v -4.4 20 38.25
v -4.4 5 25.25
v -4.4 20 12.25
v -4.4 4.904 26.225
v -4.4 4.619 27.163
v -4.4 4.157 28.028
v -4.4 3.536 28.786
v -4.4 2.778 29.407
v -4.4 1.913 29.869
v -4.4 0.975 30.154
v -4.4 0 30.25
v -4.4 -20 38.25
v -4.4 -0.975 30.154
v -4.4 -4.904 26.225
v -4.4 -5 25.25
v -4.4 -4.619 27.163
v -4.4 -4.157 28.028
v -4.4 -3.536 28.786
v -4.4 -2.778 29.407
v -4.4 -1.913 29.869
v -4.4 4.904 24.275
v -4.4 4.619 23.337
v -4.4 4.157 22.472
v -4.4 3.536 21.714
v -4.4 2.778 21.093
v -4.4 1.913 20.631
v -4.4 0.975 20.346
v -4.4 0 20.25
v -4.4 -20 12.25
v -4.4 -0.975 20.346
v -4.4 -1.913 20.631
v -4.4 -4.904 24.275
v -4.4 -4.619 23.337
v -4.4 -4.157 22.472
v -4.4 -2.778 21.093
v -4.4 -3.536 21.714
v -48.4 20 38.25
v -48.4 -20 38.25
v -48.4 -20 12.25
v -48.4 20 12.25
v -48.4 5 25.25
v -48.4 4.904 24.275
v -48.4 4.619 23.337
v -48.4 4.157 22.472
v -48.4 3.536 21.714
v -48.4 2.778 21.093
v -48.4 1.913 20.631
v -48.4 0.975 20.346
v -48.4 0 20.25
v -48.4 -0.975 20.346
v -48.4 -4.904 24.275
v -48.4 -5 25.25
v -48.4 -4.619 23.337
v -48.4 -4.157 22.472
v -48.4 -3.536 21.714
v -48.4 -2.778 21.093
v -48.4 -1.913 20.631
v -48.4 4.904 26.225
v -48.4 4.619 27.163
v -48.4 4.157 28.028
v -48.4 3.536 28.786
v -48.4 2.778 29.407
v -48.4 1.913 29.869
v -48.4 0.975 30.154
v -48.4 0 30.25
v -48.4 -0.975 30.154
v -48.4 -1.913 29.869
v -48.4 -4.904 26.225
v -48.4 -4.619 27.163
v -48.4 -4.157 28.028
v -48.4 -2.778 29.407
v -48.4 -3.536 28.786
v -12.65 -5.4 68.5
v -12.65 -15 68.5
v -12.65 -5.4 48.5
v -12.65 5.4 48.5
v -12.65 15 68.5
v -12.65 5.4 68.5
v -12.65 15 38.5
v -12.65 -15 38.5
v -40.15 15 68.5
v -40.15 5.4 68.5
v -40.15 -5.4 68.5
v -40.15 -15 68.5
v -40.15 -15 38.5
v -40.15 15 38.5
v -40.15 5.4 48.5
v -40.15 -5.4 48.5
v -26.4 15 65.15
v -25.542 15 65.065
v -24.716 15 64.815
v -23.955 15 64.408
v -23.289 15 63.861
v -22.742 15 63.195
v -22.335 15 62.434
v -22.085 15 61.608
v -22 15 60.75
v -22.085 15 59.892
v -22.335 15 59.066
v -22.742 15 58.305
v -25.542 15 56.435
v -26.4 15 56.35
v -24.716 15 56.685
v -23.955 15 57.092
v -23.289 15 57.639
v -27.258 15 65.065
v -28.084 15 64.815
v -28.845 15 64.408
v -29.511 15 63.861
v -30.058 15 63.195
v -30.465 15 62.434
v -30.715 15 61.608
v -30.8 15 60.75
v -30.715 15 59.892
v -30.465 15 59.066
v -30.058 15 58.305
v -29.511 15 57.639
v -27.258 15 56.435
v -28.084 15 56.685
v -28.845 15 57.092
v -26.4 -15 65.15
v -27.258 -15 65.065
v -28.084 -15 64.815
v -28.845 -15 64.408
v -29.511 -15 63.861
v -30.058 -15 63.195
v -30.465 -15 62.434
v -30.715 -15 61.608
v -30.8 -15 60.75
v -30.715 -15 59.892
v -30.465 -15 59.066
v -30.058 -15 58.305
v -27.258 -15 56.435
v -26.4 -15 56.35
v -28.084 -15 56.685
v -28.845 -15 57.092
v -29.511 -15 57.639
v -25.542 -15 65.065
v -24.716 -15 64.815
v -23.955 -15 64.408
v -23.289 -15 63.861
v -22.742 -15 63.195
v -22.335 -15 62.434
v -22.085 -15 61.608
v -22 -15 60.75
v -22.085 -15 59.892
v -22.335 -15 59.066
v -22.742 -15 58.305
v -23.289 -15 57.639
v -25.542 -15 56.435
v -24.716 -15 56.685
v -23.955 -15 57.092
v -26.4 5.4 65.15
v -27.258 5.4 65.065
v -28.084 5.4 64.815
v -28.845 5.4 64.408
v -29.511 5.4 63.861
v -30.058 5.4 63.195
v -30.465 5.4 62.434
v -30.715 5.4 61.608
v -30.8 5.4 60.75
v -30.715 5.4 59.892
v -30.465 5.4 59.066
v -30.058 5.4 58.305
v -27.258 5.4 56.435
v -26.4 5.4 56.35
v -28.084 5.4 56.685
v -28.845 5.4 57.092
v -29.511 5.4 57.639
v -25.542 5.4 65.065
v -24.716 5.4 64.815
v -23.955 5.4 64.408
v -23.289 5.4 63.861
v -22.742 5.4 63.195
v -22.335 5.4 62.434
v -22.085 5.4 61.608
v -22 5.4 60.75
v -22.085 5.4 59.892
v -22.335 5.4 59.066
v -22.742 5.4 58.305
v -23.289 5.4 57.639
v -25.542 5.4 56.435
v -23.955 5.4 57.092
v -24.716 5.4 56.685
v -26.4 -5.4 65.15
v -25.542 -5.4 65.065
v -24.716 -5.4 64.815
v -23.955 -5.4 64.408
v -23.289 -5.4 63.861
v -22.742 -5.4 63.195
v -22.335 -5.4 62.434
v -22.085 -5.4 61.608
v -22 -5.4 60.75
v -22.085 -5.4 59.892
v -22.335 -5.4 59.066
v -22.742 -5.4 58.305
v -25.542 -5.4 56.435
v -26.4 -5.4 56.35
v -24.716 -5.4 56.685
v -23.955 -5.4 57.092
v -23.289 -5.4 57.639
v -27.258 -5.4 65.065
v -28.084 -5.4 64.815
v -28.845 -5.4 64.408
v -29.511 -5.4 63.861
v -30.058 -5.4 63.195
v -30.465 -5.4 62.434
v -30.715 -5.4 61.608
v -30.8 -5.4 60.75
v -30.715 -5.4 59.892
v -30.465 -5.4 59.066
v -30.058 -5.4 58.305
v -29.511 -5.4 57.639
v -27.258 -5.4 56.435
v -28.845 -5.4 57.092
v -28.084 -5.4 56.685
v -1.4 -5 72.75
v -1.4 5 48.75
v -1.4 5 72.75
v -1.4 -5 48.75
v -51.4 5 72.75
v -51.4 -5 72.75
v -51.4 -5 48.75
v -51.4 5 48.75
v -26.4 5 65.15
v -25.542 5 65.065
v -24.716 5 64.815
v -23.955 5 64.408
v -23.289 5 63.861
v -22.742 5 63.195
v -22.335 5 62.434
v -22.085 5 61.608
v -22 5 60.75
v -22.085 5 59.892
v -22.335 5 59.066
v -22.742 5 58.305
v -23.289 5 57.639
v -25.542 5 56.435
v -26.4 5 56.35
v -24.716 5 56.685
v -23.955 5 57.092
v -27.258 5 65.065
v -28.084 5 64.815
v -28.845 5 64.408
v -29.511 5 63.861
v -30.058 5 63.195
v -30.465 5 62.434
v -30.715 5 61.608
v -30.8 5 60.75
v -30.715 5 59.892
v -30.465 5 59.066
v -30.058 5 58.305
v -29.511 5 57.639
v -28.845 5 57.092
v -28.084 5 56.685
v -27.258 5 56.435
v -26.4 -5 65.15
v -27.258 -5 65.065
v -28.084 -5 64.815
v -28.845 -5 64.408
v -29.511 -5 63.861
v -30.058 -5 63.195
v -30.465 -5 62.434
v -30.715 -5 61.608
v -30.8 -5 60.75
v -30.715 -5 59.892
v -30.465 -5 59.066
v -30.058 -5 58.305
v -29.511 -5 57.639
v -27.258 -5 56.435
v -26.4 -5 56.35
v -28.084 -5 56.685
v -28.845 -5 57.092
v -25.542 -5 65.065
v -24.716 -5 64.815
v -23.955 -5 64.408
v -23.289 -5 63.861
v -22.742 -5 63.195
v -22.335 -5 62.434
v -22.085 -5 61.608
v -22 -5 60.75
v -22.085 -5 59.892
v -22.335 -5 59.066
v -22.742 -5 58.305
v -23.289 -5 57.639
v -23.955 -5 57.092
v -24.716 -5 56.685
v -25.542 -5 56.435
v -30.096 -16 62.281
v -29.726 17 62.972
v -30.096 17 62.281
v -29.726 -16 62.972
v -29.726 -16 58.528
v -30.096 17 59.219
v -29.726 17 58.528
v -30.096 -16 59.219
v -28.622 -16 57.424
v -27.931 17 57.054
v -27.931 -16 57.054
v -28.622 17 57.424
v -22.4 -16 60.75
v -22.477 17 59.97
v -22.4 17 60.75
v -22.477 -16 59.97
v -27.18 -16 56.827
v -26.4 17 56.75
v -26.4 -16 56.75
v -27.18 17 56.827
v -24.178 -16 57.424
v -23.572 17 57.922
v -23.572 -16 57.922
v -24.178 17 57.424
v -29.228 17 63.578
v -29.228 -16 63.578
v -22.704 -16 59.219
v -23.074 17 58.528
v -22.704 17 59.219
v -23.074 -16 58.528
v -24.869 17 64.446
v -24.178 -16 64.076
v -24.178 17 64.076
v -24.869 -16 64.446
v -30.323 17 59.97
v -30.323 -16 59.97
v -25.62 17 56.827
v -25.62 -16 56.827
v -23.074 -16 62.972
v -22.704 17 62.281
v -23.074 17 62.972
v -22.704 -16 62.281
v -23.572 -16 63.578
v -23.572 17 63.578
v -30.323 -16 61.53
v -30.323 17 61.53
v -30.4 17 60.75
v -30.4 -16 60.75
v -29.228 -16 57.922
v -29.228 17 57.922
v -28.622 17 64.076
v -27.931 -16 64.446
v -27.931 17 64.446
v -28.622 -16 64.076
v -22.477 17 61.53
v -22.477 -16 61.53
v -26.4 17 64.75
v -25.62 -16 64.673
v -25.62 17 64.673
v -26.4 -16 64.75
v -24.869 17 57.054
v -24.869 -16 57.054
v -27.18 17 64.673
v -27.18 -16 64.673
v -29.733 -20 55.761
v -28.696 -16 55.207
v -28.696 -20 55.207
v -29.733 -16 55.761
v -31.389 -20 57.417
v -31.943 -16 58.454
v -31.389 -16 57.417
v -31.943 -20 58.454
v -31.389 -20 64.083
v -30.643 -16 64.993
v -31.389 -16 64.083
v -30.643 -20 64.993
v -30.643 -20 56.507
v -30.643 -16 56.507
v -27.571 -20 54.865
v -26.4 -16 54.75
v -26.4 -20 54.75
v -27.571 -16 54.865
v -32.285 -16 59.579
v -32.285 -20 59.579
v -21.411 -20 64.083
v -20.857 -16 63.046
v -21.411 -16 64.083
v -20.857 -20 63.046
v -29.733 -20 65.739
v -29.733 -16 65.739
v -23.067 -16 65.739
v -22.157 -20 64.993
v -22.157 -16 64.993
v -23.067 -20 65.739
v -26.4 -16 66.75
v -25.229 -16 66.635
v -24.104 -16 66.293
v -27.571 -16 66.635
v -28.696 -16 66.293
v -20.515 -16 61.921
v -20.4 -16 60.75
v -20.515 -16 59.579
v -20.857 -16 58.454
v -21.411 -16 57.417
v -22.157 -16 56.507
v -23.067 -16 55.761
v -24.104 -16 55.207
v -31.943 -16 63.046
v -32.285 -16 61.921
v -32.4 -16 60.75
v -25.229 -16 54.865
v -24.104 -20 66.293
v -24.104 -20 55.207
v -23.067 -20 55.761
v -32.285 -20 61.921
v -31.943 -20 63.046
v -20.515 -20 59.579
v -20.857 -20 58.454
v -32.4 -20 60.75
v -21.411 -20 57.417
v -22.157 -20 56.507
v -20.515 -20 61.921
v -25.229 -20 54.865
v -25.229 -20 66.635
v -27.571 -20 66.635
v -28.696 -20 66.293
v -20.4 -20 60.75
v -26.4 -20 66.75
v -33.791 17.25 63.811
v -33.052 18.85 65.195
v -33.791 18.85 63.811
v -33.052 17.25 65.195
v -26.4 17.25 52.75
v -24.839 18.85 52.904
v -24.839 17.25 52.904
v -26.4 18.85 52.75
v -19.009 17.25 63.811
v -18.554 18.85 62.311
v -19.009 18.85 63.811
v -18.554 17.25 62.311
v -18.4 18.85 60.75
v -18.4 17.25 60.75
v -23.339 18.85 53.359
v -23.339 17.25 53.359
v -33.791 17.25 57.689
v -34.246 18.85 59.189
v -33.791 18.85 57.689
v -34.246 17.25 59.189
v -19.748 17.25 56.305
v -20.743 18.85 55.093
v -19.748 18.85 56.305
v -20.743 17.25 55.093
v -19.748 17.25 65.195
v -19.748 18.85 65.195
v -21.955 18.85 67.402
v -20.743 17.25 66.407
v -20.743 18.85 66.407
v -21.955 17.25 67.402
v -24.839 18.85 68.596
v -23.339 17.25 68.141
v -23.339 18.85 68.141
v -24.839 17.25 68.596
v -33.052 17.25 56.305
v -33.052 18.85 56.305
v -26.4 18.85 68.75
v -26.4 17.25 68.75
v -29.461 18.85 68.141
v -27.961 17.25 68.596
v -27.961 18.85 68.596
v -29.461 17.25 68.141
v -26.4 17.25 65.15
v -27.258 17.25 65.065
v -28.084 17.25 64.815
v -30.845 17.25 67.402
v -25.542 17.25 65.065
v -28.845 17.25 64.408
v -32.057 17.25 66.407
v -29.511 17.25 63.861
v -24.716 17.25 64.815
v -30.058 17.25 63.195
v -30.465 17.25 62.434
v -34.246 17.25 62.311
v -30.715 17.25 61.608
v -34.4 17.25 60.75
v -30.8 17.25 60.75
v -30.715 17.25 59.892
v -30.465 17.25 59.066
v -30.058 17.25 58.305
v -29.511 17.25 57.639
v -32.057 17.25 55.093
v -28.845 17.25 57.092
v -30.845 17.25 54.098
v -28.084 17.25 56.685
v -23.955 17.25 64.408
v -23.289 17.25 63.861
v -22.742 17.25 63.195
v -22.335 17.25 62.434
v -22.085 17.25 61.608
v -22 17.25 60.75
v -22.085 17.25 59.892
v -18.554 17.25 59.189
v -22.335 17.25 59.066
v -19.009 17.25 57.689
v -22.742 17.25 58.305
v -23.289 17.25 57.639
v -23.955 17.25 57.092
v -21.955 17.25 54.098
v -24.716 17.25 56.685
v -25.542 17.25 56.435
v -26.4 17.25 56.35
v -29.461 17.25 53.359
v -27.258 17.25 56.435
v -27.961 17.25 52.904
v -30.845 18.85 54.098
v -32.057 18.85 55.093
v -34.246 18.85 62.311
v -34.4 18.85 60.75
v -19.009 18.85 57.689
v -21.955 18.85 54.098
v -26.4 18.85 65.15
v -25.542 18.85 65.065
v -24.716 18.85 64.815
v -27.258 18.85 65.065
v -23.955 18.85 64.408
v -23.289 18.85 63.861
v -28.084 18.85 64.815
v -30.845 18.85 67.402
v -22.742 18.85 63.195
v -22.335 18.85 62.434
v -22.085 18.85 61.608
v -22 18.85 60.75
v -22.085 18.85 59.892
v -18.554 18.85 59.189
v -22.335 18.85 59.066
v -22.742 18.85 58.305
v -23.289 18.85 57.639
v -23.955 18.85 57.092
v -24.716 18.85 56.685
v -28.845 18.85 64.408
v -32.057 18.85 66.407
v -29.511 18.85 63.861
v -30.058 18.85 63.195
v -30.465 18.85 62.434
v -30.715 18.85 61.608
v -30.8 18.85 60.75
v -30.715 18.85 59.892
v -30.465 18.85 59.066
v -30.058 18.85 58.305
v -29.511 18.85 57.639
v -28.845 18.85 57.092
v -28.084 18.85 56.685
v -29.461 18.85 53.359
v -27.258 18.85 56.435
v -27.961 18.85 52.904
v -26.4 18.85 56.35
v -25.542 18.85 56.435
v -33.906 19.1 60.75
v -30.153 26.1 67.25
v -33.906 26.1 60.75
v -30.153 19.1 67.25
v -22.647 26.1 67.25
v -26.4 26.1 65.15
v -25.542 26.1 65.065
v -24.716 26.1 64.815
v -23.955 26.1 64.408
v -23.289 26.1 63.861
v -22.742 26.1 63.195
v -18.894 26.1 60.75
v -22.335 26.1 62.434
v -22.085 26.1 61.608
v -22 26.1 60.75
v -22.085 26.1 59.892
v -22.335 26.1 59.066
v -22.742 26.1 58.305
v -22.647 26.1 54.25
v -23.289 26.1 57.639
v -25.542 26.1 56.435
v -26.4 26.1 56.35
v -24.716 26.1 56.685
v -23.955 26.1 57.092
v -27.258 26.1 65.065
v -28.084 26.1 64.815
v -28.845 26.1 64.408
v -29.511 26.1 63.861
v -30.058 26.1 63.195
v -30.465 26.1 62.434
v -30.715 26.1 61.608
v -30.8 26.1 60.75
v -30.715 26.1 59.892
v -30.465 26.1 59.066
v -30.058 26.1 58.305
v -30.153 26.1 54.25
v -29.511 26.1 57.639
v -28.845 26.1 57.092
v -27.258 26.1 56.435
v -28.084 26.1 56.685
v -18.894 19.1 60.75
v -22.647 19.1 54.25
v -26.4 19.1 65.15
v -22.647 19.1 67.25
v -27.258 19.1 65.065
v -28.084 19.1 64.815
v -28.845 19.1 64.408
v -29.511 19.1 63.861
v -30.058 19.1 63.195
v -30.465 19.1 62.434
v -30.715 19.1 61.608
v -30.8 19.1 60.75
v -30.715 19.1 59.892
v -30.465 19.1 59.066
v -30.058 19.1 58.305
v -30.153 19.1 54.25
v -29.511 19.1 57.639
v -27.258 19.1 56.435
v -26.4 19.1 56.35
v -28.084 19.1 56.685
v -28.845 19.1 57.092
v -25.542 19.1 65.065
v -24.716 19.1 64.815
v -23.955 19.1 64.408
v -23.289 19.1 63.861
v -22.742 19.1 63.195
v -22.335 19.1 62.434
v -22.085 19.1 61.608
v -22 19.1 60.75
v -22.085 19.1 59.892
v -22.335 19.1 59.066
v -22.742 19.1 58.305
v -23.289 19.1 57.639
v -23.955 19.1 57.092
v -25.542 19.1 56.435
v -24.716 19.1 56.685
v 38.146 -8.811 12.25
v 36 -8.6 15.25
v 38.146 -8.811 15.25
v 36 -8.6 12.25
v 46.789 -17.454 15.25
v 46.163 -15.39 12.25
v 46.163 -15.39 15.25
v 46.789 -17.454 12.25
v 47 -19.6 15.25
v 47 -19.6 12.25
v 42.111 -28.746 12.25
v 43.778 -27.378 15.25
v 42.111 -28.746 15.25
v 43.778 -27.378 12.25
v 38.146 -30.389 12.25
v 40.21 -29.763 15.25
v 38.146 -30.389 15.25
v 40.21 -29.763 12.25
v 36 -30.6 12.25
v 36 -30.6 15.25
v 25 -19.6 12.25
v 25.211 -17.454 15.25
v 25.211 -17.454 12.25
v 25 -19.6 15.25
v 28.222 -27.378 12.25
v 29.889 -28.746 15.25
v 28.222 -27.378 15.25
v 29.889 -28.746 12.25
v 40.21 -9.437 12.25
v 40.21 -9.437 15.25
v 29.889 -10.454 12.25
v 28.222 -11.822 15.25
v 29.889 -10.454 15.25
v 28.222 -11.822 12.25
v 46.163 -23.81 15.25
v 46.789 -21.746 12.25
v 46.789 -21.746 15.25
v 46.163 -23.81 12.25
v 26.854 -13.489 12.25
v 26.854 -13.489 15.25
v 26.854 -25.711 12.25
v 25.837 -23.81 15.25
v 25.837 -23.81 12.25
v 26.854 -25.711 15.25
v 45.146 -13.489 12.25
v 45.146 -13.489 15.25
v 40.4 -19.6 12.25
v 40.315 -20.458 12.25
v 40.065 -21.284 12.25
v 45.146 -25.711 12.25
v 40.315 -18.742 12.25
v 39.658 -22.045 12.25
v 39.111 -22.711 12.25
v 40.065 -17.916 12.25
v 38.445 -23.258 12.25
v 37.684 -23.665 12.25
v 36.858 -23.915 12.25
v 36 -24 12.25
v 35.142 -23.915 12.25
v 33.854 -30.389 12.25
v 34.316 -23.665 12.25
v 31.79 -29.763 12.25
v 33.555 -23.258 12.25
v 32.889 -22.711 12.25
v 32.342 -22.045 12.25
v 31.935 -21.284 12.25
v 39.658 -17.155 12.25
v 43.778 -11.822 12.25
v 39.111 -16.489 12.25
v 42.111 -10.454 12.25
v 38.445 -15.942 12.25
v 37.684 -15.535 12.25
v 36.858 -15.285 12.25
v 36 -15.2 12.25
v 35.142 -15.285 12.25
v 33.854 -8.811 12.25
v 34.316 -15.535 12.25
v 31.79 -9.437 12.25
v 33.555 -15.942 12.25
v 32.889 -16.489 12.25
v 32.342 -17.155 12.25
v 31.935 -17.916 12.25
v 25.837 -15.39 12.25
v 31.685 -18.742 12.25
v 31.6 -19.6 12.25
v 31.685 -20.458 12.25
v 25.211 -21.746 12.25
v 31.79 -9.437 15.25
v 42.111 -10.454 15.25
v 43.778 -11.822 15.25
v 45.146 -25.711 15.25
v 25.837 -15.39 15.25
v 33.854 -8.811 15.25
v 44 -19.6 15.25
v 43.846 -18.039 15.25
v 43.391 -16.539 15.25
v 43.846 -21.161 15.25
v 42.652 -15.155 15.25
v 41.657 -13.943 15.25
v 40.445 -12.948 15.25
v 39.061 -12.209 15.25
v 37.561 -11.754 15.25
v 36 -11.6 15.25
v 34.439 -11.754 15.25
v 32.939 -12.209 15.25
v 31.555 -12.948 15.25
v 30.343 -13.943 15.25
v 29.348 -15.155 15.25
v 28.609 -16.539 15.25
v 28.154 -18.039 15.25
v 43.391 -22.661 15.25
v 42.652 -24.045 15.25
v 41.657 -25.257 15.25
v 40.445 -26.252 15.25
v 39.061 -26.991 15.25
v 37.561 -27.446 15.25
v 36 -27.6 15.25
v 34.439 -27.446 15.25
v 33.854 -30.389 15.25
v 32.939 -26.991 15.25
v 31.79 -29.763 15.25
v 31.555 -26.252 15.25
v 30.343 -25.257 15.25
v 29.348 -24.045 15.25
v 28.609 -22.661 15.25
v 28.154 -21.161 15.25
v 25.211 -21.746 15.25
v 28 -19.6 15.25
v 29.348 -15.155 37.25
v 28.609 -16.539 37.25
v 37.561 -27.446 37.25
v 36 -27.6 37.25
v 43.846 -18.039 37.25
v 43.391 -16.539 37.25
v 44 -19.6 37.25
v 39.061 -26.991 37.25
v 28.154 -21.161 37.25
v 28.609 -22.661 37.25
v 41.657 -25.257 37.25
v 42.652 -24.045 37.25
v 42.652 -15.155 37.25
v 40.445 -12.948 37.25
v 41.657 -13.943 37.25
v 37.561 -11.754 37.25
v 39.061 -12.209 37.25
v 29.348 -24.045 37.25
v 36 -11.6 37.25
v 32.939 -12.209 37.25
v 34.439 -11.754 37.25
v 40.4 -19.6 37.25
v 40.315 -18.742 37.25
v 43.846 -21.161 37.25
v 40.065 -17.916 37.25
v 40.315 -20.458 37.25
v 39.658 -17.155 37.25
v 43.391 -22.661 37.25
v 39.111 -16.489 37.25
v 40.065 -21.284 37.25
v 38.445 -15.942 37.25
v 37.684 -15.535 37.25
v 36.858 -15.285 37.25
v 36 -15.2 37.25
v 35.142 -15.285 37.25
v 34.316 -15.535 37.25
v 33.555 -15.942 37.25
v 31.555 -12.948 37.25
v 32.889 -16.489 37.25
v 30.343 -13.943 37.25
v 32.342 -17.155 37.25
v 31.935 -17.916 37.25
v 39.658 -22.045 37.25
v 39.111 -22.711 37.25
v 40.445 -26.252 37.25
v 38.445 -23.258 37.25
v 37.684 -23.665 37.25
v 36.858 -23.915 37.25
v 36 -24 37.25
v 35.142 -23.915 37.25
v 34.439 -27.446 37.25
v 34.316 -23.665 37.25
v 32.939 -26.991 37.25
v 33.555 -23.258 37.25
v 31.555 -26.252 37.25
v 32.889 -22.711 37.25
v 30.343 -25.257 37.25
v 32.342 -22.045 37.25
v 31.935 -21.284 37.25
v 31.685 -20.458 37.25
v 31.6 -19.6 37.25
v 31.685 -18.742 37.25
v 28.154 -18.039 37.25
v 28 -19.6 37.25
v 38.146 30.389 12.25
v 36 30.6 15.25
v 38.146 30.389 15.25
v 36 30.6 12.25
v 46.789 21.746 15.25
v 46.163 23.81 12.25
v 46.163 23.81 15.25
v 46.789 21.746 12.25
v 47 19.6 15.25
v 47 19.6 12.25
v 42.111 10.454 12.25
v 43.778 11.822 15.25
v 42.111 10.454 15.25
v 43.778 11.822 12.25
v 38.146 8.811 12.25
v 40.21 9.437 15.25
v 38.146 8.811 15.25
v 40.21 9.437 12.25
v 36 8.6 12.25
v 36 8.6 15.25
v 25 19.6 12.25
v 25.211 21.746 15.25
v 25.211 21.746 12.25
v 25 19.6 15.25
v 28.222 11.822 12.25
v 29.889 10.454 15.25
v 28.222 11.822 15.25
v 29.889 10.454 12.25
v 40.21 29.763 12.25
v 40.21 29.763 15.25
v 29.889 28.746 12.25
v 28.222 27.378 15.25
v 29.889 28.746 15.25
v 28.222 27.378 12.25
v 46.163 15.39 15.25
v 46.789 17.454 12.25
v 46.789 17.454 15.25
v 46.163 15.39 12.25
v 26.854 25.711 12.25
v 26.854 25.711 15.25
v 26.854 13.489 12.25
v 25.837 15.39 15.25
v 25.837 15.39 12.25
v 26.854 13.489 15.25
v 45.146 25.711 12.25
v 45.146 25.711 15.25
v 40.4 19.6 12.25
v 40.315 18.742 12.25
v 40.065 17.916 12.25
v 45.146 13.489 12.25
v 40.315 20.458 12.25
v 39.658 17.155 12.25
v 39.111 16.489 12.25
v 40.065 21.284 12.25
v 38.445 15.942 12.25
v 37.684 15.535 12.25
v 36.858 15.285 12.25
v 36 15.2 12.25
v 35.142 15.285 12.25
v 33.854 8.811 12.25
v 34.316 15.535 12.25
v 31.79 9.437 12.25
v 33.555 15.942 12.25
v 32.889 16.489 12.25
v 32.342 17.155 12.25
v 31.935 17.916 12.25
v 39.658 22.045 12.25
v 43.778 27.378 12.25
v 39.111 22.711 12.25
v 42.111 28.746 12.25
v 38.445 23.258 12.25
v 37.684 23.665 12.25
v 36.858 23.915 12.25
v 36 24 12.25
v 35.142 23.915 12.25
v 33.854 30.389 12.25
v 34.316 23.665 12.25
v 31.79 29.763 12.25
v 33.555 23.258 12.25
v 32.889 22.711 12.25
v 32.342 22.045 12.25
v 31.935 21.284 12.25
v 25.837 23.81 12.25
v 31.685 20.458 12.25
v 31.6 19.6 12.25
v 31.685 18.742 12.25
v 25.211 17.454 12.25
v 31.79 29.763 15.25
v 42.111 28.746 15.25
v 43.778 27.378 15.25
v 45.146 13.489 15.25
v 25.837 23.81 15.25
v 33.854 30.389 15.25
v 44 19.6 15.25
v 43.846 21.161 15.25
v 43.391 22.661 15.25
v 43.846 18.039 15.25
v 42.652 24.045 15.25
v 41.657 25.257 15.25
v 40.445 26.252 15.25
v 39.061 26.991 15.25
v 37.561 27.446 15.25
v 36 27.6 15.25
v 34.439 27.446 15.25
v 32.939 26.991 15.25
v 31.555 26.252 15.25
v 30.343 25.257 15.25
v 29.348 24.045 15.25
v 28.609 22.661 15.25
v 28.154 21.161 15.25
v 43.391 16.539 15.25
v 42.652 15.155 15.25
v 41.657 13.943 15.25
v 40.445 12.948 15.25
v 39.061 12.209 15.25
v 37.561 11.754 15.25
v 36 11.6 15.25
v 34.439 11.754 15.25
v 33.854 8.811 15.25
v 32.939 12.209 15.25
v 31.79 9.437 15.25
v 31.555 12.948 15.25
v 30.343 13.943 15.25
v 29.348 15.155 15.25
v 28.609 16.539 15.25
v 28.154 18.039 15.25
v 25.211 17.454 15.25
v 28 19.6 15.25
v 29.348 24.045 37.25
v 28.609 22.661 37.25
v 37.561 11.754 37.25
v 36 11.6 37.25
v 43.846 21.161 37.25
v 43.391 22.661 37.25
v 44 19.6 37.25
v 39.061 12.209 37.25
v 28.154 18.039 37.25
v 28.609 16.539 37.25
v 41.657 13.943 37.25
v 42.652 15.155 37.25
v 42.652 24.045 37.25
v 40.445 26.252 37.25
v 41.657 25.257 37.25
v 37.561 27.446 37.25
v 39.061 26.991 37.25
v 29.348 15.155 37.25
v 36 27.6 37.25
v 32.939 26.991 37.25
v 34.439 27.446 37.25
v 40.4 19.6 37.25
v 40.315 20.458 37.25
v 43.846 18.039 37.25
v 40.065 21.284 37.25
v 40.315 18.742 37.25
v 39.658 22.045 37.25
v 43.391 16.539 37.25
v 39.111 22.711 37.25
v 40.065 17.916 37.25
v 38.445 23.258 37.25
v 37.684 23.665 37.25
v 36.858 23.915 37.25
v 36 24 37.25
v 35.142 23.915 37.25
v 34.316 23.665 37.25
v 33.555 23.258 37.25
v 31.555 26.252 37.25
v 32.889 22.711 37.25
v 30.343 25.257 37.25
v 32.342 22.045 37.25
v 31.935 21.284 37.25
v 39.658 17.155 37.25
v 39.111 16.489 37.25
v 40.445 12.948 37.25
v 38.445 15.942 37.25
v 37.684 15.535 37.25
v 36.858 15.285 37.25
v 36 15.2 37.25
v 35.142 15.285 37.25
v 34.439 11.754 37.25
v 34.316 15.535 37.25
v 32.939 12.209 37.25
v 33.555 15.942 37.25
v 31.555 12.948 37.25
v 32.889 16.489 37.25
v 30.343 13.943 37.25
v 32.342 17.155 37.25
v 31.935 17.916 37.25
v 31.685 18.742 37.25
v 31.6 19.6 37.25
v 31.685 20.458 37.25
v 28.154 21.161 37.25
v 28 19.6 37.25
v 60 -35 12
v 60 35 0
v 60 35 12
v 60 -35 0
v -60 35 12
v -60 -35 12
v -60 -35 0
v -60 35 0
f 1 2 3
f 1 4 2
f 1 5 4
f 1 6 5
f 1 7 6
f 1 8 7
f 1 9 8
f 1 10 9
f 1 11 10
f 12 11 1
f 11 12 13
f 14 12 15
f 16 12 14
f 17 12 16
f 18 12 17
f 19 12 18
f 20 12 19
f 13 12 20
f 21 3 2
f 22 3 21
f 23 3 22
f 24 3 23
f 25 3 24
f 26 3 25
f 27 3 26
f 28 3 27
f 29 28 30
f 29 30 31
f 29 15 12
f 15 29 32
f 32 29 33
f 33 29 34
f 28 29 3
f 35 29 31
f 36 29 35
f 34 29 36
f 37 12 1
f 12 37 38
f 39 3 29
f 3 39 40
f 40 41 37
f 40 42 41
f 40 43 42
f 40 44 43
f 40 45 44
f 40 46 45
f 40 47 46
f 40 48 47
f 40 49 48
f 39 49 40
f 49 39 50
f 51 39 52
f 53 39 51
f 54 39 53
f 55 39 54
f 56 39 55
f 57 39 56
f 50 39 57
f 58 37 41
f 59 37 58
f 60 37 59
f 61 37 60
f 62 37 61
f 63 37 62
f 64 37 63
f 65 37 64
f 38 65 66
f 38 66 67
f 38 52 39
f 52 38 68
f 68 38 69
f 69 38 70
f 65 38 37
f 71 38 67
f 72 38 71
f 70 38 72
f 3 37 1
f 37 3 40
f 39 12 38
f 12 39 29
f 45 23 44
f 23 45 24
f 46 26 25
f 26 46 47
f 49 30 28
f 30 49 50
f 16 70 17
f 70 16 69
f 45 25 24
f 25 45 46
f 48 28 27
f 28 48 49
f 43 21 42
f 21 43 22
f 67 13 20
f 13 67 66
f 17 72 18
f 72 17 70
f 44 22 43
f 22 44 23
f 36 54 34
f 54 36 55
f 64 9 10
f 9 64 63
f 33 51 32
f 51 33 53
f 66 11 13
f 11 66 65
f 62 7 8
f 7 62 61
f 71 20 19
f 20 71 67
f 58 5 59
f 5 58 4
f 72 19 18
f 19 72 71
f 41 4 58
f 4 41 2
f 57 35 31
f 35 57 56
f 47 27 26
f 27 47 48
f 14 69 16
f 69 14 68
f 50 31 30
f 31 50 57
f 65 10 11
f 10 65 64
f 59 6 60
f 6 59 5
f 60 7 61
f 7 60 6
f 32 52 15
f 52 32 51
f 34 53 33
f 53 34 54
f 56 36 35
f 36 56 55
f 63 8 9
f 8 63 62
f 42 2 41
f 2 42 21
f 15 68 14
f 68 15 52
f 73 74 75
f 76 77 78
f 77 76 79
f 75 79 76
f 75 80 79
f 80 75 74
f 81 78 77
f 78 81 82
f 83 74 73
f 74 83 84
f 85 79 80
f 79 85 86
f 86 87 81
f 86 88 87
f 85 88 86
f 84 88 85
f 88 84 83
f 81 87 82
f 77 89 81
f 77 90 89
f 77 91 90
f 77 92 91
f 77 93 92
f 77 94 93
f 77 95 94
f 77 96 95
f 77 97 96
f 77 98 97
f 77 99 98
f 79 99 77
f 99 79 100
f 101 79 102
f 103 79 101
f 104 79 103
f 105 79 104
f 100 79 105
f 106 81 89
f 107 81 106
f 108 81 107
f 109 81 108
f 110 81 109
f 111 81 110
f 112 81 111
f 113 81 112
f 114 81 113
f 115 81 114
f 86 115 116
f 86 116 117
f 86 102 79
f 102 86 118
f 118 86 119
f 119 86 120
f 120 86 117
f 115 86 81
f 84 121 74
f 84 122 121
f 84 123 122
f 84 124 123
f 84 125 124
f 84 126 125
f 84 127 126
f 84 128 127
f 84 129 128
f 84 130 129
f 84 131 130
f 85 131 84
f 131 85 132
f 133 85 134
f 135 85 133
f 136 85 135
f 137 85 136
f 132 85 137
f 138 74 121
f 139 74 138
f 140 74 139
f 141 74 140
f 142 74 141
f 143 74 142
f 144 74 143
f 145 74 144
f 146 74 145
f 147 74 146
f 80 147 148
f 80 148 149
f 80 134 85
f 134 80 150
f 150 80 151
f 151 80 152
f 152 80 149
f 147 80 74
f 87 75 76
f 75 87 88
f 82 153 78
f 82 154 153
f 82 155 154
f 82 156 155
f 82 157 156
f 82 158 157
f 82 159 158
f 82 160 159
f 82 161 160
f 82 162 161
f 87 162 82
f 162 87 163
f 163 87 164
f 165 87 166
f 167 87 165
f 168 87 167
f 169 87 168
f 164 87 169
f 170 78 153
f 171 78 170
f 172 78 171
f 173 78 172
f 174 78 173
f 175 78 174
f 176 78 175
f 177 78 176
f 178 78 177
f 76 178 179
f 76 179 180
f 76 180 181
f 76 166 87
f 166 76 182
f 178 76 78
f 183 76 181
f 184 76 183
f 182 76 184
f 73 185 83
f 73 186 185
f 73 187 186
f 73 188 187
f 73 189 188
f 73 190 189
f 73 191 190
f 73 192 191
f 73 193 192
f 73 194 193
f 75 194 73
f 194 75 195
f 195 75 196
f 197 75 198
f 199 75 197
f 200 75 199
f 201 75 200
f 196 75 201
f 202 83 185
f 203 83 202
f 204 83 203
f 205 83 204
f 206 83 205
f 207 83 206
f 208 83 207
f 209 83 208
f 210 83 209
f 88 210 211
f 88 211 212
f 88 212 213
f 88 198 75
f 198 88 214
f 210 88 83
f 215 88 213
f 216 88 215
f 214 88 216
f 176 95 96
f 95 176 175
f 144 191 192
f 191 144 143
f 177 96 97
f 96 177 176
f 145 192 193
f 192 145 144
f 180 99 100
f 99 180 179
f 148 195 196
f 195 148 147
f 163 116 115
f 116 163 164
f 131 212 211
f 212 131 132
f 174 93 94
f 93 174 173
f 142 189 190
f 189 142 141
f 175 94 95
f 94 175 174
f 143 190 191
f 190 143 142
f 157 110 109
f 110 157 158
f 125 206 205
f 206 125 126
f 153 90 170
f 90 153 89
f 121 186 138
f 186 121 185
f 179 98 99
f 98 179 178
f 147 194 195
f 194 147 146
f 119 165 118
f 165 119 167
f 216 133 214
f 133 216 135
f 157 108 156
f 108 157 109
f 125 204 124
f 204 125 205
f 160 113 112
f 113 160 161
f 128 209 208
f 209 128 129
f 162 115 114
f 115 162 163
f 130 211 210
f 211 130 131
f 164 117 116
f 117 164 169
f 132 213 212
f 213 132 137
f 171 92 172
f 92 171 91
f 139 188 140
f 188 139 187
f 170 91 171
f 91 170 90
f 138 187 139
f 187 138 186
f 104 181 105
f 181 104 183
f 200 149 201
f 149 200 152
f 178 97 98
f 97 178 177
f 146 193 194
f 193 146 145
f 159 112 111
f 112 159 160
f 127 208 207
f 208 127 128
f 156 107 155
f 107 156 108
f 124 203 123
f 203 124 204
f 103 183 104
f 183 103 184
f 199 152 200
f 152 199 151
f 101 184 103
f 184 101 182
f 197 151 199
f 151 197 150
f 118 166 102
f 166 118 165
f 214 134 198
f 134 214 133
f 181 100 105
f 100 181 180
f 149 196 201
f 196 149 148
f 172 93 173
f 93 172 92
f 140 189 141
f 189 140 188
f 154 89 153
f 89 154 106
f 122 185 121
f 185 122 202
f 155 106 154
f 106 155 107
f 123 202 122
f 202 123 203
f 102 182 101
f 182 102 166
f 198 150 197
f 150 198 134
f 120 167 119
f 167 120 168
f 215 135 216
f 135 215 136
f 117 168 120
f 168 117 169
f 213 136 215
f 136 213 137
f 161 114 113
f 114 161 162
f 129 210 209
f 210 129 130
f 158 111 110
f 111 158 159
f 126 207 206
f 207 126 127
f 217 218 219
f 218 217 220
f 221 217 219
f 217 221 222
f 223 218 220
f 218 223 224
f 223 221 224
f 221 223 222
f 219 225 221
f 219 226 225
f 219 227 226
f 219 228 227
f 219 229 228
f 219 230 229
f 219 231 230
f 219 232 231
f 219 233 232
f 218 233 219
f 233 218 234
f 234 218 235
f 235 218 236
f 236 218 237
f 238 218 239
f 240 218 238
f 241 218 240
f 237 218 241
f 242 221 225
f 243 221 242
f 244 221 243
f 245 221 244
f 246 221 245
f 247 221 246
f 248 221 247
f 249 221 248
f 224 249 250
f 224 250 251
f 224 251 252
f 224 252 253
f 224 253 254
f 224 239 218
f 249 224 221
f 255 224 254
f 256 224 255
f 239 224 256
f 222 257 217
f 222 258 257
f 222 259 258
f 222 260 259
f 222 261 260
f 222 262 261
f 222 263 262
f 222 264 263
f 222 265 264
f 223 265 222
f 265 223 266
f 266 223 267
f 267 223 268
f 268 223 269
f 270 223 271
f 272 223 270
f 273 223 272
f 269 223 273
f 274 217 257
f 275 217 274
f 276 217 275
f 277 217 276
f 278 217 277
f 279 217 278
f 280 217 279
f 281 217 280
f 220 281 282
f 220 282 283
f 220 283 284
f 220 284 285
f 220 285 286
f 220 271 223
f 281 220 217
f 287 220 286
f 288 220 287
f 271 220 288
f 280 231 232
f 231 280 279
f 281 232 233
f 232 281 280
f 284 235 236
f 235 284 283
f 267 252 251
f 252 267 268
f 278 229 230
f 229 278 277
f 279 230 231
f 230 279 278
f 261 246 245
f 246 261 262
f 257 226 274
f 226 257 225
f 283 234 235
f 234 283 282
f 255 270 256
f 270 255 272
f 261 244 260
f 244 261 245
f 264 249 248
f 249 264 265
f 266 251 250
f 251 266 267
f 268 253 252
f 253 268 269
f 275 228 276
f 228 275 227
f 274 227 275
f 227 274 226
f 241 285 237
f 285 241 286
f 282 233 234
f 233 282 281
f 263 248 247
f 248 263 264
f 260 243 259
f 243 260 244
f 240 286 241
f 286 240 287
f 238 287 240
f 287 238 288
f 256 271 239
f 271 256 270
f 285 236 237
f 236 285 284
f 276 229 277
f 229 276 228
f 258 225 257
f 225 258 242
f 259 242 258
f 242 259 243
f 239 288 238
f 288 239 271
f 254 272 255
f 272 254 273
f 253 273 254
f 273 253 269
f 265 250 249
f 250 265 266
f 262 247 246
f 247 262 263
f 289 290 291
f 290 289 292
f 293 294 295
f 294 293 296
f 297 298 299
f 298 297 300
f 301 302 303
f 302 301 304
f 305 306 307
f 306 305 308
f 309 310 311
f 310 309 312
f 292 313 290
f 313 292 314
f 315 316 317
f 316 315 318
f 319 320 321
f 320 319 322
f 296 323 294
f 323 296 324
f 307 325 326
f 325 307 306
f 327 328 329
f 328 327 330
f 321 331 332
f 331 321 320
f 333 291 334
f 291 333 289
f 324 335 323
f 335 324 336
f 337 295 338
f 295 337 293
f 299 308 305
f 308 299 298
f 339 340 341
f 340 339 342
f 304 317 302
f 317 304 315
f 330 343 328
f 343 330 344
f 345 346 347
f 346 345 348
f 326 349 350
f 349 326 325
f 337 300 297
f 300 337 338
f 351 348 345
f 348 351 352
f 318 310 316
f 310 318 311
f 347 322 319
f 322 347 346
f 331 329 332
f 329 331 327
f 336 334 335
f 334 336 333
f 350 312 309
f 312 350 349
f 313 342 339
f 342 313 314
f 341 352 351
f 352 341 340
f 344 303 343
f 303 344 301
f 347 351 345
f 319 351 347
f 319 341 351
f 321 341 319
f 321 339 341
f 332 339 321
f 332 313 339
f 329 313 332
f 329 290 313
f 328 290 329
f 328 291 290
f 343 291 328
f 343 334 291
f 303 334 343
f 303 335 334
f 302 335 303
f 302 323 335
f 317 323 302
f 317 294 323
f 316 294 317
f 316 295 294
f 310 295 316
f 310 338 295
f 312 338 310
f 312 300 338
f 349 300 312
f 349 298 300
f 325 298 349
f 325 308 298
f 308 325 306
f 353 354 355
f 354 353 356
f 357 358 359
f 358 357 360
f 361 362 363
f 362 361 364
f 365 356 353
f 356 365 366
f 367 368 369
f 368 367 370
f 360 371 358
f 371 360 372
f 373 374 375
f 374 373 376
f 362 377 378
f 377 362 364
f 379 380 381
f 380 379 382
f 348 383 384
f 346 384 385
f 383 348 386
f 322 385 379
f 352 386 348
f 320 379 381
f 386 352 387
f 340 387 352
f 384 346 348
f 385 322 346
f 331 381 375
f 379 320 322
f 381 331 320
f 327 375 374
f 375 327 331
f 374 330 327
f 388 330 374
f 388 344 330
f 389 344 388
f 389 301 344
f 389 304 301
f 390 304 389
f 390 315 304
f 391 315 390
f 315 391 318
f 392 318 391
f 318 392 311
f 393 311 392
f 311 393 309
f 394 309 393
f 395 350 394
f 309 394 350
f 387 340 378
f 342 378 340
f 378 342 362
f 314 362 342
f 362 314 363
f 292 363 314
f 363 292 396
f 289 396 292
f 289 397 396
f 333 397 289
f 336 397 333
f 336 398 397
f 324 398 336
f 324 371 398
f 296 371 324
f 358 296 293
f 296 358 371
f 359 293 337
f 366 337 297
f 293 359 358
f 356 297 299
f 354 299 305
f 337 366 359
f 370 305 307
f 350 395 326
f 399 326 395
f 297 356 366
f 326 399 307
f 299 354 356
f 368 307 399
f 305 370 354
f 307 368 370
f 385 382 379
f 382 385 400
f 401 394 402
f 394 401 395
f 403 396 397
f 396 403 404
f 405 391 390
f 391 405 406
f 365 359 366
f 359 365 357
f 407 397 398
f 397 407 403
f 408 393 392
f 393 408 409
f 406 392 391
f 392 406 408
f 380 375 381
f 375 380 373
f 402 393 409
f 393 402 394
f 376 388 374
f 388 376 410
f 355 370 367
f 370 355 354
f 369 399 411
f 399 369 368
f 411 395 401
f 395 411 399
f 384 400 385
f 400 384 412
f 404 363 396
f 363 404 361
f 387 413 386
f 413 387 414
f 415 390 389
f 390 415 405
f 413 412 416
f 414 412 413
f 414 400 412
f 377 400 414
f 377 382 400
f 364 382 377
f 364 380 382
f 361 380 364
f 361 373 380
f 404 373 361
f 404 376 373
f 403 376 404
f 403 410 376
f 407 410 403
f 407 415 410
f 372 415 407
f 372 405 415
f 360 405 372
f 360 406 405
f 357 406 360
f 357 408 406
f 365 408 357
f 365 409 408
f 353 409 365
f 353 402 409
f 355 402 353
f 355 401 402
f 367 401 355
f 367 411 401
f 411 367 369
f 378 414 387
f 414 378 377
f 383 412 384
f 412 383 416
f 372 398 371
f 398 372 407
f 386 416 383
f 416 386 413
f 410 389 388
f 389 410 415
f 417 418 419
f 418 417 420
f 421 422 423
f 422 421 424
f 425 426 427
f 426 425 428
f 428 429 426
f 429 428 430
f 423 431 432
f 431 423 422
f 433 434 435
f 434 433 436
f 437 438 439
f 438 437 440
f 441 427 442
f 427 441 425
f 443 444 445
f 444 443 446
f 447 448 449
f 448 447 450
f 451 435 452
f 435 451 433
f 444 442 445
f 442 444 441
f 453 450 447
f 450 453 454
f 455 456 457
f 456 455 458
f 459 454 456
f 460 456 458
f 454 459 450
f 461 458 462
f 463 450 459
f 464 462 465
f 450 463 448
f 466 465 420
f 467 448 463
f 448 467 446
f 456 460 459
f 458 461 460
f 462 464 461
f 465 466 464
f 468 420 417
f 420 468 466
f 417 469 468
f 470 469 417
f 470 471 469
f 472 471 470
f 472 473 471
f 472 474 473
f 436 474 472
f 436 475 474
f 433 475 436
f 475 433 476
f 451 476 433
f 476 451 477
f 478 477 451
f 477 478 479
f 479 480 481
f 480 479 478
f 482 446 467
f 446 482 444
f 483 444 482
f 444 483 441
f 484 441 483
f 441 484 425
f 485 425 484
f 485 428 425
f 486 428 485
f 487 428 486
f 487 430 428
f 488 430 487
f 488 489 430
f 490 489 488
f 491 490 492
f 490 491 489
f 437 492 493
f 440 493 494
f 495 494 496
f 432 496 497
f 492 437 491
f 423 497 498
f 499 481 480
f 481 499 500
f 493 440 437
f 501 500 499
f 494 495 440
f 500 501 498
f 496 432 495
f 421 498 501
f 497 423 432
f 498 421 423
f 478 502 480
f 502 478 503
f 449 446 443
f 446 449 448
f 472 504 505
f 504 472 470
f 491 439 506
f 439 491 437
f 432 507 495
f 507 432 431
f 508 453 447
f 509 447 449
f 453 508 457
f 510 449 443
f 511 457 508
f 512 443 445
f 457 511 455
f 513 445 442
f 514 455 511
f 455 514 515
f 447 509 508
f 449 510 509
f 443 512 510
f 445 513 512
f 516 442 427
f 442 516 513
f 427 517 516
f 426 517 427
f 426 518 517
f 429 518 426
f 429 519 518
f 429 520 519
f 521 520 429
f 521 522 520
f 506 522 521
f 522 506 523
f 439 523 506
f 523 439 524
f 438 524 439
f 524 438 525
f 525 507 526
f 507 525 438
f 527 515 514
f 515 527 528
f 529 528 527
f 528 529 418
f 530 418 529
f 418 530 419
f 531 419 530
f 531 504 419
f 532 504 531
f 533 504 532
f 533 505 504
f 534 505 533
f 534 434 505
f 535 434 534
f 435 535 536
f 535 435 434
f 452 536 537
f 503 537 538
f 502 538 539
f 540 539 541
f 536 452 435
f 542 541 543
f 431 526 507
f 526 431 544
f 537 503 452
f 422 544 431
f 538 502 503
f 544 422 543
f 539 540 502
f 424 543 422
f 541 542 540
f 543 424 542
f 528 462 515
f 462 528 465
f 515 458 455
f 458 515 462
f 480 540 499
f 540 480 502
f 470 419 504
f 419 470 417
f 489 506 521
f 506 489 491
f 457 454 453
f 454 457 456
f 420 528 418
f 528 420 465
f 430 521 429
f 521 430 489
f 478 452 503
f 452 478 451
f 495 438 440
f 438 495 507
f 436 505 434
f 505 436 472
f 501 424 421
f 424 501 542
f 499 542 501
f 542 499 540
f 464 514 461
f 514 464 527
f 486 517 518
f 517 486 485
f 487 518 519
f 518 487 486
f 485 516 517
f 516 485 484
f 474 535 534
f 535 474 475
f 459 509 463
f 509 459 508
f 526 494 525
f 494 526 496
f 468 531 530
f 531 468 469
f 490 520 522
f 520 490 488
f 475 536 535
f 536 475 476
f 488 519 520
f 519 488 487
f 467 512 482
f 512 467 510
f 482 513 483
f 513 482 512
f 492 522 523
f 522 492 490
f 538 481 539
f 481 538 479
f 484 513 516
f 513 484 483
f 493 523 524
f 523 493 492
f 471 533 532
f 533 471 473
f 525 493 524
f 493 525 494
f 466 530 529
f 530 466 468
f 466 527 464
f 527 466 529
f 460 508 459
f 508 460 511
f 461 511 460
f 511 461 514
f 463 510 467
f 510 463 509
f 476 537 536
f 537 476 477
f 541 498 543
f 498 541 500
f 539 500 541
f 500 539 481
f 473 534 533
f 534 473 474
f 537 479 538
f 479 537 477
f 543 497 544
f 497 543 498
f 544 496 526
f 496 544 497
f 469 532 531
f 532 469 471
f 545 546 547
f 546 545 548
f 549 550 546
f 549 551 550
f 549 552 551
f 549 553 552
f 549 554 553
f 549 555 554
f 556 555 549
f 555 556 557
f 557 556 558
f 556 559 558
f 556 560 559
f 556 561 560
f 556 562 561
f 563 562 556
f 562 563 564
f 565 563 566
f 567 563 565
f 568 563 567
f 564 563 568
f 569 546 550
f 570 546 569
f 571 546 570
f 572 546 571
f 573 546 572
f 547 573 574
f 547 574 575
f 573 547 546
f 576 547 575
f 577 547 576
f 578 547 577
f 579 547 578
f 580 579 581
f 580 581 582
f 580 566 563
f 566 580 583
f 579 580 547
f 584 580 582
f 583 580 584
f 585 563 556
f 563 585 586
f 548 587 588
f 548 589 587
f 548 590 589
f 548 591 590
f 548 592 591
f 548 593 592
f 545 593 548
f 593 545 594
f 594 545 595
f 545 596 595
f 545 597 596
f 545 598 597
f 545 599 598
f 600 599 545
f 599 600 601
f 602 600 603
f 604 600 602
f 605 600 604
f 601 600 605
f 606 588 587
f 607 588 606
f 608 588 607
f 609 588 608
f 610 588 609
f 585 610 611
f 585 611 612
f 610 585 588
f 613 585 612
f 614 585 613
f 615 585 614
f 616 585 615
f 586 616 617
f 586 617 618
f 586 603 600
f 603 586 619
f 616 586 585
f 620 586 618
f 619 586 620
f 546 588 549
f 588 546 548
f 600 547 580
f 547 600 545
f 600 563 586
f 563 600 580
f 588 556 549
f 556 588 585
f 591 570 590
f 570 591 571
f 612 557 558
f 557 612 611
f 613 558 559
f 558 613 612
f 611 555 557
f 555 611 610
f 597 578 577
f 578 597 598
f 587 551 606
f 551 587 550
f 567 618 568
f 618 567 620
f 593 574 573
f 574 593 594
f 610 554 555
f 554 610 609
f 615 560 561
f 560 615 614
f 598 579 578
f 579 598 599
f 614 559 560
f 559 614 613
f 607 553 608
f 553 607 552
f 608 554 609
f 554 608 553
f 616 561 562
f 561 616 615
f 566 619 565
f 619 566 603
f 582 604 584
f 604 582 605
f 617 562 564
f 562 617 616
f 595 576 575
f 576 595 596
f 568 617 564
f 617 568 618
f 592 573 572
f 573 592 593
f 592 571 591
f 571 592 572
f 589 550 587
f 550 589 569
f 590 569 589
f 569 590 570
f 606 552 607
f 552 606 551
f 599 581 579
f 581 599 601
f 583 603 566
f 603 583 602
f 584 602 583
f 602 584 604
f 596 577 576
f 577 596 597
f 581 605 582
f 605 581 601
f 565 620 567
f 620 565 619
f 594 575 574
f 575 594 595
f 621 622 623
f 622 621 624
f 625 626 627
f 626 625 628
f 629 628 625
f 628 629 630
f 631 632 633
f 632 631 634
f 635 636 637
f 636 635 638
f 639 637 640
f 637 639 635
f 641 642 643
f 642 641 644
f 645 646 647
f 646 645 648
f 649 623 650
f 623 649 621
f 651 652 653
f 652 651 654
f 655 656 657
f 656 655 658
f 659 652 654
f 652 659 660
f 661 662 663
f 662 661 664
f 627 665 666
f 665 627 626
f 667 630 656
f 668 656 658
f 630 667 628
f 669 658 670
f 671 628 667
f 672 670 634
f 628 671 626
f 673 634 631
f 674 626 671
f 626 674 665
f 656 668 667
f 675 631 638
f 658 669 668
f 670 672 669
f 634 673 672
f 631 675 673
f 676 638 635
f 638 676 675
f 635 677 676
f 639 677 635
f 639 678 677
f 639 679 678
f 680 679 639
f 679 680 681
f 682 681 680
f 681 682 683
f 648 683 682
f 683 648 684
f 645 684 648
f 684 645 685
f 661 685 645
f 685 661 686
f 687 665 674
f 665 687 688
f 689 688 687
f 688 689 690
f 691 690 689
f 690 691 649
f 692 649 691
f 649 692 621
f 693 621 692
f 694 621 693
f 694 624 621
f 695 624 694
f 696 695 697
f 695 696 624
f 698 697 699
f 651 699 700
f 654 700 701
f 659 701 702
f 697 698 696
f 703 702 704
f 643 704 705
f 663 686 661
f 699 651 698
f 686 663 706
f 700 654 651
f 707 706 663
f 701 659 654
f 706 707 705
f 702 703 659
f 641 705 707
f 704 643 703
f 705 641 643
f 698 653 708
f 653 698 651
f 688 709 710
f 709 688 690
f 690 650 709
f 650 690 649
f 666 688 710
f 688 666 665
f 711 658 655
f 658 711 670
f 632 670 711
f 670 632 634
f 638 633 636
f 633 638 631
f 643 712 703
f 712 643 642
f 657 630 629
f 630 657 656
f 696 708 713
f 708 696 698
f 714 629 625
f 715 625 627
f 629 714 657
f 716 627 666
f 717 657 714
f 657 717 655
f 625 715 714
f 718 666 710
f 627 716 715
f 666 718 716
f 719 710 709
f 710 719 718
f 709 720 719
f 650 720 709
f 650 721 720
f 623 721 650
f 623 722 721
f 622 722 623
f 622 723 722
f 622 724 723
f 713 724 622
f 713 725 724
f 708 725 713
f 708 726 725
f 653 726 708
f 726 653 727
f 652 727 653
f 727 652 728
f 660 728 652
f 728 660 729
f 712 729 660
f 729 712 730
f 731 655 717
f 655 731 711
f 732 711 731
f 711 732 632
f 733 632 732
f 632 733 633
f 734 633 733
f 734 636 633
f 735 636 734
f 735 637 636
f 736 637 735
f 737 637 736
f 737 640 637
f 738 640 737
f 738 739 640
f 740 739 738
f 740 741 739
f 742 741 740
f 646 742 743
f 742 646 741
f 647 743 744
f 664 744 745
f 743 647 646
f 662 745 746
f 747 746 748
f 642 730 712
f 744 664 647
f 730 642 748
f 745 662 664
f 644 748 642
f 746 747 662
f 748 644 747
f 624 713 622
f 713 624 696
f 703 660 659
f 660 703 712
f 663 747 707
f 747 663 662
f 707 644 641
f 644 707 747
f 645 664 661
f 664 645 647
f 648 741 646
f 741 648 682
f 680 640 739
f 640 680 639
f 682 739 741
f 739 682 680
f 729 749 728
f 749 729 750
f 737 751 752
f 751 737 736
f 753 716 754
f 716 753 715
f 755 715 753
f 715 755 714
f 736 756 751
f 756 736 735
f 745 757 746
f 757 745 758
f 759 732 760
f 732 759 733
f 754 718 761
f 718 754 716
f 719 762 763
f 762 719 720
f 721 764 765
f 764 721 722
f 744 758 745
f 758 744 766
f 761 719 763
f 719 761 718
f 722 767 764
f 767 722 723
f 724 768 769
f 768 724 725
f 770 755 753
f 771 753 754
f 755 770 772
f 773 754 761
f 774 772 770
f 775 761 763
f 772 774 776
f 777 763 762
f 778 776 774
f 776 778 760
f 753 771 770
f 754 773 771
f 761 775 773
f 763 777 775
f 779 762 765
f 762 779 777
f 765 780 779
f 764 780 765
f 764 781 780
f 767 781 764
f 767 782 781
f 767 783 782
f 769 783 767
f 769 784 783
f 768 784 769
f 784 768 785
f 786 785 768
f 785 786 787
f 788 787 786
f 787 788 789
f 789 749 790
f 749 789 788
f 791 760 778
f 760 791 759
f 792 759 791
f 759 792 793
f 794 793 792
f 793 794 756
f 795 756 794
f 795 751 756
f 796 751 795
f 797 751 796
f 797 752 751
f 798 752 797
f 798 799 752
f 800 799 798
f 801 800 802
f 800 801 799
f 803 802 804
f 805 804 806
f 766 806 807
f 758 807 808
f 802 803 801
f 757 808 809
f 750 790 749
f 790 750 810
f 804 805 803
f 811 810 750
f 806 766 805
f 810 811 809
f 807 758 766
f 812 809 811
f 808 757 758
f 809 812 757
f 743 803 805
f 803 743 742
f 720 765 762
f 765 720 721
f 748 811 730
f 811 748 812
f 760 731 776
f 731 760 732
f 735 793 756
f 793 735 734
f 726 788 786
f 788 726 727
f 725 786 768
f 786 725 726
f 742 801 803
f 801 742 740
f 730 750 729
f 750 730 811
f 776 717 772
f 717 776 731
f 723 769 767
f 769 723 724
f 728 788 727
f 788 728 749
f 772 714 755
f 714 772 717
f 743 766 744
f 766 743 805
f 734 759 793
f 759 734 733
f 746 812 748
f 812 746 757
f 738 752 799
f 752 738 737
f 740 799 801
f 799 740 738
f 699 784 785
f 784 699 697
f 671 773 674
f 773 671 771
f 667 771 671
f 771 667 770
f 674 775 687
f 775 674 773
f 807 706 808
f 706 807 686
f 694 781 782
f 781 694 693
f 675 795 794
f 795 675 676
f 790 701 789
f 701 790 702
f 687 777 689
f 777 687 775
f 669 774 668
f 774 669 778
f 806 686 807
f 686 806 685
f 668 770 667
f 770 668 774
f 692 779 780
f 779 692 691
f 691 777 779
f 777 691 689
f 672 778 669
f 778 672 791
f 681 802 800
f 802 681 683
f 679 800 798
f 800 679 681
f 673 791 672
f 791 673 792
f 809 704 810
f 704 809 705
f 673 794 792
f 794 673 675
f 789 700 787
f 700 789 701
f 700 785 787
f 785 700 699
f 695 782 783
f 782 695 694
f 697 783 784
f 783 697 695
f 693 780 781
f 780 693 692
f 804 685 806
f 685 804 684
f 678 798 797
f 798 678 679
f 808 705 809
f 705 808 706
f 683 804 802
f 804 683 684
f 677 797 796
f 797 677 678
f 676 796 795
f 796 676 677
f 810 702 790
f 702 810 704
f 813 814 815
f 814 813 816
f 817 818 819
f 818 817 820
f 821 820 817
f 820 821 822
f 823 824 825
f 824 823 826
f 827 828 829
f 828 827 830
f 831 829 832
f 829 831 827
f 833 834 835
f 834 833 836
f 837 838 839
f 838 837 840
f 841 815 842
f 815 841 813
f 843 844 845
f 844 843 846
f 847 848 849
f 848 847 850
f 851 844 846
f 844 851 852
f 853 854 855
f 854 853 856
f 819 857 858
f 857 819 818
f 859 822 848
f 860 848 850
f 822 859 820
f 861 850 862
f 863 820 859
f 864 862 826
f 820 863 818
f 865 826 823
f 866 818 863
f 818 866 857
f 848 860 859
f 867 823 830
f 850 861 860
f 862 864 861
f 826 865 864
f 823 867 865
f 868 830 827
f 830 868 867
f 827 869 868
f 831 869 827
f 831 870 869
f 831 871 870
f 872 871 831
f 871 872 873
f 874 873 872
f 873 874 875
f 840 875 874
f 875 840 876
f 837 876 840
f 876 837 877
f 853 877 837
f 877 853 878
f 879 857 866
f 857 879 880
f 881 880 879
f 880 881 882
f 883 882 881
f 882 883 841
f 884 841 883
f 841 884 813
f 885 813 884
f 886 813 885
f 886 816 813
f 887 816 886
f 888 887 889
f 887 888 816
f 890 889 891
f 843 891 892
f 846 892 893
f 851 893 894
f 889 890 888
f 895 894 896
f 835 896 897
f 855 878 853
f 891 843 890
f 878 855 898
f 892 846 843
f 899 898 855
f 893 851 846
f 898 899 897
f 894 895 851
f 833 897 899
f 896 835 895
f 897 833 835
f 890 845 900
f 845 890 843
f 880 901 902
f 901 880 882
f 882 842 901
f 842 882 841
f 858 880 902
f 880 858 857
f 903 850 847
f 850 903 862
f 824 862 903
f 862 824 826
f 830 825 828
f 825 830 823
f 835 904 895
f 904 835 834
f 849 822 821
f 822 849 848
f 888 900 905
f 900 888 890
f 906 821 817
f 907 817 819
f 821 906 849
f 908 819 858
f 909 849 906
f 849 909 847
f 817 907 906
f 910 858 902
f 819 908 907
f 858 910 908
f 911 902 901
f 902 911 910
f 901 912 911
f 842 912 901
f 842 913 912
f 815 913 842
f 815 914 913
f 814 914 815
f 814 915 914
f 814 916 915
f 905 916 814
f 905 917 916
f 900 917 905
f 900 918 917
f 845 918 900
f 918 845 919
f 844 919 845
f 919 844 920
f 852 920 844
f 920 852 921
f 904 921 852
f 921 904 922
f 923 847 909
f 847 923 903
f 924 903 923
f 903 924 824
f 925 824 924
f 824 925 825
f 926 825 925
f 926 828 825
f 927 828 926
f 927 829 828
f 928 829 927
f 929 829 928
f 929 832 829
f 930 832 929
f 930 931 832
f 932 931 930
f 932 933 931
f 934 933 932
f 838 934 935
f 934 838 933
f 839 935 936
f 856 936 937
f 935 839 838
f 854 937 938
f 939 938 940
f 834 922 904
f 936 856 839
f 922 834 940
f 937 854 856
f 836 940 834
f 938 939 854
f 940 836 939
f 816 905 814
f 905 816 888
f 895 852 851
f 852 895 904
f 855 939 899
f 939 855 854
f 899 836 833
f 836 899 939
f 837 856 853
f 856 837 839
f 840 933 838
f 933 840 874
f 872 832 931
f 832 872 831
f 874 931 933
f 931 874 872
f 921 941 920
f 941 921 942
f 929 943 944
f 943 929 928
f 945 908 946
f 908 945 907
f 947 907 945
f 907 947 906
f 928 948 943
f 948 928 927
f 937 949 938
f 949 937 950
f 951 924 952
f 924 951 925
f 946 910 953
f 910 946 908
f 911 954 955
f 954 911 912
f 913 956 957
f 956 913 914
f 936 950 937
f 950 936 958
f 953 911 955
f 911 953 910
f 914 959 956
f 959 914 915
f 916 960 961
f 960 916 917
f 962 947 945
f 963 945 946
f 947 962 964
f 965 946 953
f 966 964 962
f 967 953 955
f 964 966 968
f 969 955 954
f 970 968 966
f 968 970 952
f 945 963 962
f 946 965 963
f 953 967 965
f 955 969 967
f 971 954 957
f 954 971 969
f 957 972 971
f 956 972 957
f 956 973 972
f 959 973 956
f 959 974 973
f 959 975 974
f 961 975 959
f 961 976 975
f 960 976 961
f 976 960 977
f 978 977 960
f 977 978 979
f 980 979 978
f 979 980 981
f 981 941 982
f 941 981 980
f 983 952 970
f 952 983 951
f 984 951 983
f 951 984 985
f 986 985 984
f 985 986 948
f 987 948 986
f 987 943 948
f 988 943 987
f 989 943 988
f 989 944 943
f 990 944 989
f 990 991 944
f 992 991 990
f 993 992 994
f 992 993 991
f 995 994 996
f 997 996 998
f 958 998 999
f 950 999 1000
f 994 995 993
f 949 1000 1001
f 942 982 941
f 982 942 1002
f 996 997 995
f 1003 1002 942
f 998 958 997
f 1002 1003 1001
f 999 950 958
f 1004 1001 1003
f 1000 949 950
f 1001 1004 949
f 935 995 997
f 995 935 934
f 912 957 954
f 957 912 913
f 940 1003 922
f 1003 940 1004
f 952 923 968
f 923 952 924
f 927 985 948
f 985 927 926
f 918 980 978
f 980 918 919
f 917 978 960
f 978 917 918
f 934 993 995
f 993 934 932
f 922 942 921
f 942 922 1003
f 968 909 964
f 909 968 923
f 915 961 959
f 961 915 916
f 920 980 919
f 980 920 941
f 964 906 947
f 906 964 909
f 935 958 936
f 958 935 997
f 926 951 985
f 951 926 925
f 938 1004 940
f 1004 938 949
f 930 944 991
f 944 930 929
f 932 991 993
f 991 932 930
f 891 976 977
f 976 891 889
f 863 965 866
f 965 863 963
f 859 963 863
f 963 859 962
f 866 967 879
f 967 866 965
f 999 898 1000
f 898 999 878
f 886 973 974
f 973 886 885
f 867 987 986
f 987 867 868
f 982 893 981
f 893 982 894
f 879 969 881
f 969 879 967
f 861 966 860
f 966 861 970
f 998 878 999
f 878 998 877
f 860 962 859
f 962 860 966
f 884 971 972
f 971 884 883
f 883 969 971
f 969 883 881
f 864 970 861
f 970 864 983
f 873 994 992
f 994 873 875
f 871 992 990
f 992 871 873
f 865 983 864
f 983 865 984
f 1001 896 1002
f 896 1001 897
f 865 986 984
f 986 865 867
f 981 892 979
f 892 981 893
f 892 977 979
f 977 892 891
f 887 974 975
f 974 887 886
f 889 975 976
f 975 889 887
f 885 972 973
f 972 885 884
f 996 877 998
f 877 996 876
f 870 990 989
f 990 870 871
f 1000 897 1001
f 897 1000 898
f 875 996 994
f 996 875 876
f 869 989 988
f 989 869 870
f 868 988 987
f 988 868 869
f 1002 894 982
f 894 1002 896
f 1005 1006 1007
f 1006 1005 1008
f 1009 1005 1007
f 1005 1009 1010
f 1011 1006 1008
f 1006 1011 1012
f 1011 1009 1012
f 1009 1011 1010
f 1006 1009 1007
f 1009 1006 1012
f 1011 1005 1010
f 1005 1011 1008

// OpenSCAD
$fn = 32;

// ------------------------------------------------------------------------
// Indexing jig: plate 120 x 70 mm, pin d8
// Every part is its own module, assembly() places every instance.
// ------------------------------------------------------------------------

// --- part 1 ---
module jig_plate() {
  difference() {
    translate([-60, -35, 0]) cube([120, 70, 12]);
  }
}

// --- part 2 ---
module locator_block() {
  difference() {
    translate([-22, -20, 0]) cube([44, 40, 26]);
    translate([0, 0, 13]) rotate([0, 90, 0]) cylinder(h = 46, d = 10, center = true);
  }
}

// --- part 3 ---
module index_fork() {
  difference() {
    translate([-13.75, -15, 0]) cube([27.5, 30, 30]);
    translate([-14.75, -5.4, 10]) cube([29.5, 10.8, 21]);
    translate([0, 0, 22.25]) rotate([90, 0, 0]) cylinder(h = 32, d = 8.8, center = true);
  }
}

// --- part 4 ---
module index_arm() {
  difference() {
    translate([-25, -5, 0]) cube([50, 10, 24]);
    translate([0, 0, 12]) rotate([90, 0, 0]) cylinder(h = 12, d = 8.8, center = true);
  }
}

// --- part 5 ---
module index_pin() {
  rotate([0, 90, 0]) cylinder(h = 34, d = 8, center = true);
  translate([-20, 0, 0]) rotate([0, 90, 0]) cylinder(h = 4, d = 12);
}

// --- part 6 ---
module pin_washer() {
  difference() {
      translate([0, 0, 0]) cylinder(h = 1.6, d = 16);
      translate([0, 0, -1]) cylinder(h = 3.6, d = 8.8);
    }
}

// --- part 7 ---
module lock_nut() {
  difference() {
    linear_extrude(height = 7) polygon(points = [[7.506, 0], [3.753, 6.5], [-3.753, 6.5], [-7.506, 0], [-3.753, -6.5], [3.753, -6.5]]);
    translate([0, 0, -1]) cylinder(h = 9, d = 8.8);
  }
}

// --- part 8 ---
module guide_bush_a() {
  difference() {
    union() {
      cylinder(h = 3, d = 22);
      translate([0, 0, 3]) cylinder(h = 22, d = 16);
    }
    translate([0, 0, -1]) cylinder(h = 27, d = 8.8);
  }
}

// --- part 9 ---
module guide_bush_b() {
  difference() {
    union() {
      cylinder(h = 3, d = 22);
      translate([0, 0, 3]) cylinder(h = 22, d = 16);
    }
    translate([0, 0, -1]) cylinder(h = 27, d = 8.8);
  }
}

// --- assembly ---
module assembly() {
  color([0.80, 0.24, 0.20]) translate([0, 0, 0]) rotate([0, 0, 0]) jig_plate();
  color([0.20, 0.45, 0.75]) translate([-26.4, 0, 12.25]) rotate([0, 0, 0]) locator_block();
  color([0.25, 0.62, 0.32]) translate([-26.4, 0, 38.5]) rotate([0, 0, 0]) index_fork();
  color([0.92, 0.70, 0.18]) translate([-26.4, 0, 48.75]) rotate([0, 0, 0]) index_arm();
  color([0.58, 0.35, 0.70]) translate([-26.4, 0, 60.75]) rotate([0, 0, 90]) index_pin();
  color([0.16, 0.66, 0.66]) translate([-26.4, 18.85, 60.75]) rotate([90, 0, 0]) pin_washer();
  color([0.85, 0.48, 0.18]) translate([-26.4, 26.1, 60.75]) rotate([90, 0, 0]) lock_nut();
  color([0.55, 0.60, 0.65]) translate([36, -19.6, 12.25]) rotate([0, 0, 0]) guide_bush_a();
  color([0.75, 0.30, 0.55]) translate([36, 19.6, 12.25]) rotate([0, 0, 0]) guide_bush_b();
}

assembly();
